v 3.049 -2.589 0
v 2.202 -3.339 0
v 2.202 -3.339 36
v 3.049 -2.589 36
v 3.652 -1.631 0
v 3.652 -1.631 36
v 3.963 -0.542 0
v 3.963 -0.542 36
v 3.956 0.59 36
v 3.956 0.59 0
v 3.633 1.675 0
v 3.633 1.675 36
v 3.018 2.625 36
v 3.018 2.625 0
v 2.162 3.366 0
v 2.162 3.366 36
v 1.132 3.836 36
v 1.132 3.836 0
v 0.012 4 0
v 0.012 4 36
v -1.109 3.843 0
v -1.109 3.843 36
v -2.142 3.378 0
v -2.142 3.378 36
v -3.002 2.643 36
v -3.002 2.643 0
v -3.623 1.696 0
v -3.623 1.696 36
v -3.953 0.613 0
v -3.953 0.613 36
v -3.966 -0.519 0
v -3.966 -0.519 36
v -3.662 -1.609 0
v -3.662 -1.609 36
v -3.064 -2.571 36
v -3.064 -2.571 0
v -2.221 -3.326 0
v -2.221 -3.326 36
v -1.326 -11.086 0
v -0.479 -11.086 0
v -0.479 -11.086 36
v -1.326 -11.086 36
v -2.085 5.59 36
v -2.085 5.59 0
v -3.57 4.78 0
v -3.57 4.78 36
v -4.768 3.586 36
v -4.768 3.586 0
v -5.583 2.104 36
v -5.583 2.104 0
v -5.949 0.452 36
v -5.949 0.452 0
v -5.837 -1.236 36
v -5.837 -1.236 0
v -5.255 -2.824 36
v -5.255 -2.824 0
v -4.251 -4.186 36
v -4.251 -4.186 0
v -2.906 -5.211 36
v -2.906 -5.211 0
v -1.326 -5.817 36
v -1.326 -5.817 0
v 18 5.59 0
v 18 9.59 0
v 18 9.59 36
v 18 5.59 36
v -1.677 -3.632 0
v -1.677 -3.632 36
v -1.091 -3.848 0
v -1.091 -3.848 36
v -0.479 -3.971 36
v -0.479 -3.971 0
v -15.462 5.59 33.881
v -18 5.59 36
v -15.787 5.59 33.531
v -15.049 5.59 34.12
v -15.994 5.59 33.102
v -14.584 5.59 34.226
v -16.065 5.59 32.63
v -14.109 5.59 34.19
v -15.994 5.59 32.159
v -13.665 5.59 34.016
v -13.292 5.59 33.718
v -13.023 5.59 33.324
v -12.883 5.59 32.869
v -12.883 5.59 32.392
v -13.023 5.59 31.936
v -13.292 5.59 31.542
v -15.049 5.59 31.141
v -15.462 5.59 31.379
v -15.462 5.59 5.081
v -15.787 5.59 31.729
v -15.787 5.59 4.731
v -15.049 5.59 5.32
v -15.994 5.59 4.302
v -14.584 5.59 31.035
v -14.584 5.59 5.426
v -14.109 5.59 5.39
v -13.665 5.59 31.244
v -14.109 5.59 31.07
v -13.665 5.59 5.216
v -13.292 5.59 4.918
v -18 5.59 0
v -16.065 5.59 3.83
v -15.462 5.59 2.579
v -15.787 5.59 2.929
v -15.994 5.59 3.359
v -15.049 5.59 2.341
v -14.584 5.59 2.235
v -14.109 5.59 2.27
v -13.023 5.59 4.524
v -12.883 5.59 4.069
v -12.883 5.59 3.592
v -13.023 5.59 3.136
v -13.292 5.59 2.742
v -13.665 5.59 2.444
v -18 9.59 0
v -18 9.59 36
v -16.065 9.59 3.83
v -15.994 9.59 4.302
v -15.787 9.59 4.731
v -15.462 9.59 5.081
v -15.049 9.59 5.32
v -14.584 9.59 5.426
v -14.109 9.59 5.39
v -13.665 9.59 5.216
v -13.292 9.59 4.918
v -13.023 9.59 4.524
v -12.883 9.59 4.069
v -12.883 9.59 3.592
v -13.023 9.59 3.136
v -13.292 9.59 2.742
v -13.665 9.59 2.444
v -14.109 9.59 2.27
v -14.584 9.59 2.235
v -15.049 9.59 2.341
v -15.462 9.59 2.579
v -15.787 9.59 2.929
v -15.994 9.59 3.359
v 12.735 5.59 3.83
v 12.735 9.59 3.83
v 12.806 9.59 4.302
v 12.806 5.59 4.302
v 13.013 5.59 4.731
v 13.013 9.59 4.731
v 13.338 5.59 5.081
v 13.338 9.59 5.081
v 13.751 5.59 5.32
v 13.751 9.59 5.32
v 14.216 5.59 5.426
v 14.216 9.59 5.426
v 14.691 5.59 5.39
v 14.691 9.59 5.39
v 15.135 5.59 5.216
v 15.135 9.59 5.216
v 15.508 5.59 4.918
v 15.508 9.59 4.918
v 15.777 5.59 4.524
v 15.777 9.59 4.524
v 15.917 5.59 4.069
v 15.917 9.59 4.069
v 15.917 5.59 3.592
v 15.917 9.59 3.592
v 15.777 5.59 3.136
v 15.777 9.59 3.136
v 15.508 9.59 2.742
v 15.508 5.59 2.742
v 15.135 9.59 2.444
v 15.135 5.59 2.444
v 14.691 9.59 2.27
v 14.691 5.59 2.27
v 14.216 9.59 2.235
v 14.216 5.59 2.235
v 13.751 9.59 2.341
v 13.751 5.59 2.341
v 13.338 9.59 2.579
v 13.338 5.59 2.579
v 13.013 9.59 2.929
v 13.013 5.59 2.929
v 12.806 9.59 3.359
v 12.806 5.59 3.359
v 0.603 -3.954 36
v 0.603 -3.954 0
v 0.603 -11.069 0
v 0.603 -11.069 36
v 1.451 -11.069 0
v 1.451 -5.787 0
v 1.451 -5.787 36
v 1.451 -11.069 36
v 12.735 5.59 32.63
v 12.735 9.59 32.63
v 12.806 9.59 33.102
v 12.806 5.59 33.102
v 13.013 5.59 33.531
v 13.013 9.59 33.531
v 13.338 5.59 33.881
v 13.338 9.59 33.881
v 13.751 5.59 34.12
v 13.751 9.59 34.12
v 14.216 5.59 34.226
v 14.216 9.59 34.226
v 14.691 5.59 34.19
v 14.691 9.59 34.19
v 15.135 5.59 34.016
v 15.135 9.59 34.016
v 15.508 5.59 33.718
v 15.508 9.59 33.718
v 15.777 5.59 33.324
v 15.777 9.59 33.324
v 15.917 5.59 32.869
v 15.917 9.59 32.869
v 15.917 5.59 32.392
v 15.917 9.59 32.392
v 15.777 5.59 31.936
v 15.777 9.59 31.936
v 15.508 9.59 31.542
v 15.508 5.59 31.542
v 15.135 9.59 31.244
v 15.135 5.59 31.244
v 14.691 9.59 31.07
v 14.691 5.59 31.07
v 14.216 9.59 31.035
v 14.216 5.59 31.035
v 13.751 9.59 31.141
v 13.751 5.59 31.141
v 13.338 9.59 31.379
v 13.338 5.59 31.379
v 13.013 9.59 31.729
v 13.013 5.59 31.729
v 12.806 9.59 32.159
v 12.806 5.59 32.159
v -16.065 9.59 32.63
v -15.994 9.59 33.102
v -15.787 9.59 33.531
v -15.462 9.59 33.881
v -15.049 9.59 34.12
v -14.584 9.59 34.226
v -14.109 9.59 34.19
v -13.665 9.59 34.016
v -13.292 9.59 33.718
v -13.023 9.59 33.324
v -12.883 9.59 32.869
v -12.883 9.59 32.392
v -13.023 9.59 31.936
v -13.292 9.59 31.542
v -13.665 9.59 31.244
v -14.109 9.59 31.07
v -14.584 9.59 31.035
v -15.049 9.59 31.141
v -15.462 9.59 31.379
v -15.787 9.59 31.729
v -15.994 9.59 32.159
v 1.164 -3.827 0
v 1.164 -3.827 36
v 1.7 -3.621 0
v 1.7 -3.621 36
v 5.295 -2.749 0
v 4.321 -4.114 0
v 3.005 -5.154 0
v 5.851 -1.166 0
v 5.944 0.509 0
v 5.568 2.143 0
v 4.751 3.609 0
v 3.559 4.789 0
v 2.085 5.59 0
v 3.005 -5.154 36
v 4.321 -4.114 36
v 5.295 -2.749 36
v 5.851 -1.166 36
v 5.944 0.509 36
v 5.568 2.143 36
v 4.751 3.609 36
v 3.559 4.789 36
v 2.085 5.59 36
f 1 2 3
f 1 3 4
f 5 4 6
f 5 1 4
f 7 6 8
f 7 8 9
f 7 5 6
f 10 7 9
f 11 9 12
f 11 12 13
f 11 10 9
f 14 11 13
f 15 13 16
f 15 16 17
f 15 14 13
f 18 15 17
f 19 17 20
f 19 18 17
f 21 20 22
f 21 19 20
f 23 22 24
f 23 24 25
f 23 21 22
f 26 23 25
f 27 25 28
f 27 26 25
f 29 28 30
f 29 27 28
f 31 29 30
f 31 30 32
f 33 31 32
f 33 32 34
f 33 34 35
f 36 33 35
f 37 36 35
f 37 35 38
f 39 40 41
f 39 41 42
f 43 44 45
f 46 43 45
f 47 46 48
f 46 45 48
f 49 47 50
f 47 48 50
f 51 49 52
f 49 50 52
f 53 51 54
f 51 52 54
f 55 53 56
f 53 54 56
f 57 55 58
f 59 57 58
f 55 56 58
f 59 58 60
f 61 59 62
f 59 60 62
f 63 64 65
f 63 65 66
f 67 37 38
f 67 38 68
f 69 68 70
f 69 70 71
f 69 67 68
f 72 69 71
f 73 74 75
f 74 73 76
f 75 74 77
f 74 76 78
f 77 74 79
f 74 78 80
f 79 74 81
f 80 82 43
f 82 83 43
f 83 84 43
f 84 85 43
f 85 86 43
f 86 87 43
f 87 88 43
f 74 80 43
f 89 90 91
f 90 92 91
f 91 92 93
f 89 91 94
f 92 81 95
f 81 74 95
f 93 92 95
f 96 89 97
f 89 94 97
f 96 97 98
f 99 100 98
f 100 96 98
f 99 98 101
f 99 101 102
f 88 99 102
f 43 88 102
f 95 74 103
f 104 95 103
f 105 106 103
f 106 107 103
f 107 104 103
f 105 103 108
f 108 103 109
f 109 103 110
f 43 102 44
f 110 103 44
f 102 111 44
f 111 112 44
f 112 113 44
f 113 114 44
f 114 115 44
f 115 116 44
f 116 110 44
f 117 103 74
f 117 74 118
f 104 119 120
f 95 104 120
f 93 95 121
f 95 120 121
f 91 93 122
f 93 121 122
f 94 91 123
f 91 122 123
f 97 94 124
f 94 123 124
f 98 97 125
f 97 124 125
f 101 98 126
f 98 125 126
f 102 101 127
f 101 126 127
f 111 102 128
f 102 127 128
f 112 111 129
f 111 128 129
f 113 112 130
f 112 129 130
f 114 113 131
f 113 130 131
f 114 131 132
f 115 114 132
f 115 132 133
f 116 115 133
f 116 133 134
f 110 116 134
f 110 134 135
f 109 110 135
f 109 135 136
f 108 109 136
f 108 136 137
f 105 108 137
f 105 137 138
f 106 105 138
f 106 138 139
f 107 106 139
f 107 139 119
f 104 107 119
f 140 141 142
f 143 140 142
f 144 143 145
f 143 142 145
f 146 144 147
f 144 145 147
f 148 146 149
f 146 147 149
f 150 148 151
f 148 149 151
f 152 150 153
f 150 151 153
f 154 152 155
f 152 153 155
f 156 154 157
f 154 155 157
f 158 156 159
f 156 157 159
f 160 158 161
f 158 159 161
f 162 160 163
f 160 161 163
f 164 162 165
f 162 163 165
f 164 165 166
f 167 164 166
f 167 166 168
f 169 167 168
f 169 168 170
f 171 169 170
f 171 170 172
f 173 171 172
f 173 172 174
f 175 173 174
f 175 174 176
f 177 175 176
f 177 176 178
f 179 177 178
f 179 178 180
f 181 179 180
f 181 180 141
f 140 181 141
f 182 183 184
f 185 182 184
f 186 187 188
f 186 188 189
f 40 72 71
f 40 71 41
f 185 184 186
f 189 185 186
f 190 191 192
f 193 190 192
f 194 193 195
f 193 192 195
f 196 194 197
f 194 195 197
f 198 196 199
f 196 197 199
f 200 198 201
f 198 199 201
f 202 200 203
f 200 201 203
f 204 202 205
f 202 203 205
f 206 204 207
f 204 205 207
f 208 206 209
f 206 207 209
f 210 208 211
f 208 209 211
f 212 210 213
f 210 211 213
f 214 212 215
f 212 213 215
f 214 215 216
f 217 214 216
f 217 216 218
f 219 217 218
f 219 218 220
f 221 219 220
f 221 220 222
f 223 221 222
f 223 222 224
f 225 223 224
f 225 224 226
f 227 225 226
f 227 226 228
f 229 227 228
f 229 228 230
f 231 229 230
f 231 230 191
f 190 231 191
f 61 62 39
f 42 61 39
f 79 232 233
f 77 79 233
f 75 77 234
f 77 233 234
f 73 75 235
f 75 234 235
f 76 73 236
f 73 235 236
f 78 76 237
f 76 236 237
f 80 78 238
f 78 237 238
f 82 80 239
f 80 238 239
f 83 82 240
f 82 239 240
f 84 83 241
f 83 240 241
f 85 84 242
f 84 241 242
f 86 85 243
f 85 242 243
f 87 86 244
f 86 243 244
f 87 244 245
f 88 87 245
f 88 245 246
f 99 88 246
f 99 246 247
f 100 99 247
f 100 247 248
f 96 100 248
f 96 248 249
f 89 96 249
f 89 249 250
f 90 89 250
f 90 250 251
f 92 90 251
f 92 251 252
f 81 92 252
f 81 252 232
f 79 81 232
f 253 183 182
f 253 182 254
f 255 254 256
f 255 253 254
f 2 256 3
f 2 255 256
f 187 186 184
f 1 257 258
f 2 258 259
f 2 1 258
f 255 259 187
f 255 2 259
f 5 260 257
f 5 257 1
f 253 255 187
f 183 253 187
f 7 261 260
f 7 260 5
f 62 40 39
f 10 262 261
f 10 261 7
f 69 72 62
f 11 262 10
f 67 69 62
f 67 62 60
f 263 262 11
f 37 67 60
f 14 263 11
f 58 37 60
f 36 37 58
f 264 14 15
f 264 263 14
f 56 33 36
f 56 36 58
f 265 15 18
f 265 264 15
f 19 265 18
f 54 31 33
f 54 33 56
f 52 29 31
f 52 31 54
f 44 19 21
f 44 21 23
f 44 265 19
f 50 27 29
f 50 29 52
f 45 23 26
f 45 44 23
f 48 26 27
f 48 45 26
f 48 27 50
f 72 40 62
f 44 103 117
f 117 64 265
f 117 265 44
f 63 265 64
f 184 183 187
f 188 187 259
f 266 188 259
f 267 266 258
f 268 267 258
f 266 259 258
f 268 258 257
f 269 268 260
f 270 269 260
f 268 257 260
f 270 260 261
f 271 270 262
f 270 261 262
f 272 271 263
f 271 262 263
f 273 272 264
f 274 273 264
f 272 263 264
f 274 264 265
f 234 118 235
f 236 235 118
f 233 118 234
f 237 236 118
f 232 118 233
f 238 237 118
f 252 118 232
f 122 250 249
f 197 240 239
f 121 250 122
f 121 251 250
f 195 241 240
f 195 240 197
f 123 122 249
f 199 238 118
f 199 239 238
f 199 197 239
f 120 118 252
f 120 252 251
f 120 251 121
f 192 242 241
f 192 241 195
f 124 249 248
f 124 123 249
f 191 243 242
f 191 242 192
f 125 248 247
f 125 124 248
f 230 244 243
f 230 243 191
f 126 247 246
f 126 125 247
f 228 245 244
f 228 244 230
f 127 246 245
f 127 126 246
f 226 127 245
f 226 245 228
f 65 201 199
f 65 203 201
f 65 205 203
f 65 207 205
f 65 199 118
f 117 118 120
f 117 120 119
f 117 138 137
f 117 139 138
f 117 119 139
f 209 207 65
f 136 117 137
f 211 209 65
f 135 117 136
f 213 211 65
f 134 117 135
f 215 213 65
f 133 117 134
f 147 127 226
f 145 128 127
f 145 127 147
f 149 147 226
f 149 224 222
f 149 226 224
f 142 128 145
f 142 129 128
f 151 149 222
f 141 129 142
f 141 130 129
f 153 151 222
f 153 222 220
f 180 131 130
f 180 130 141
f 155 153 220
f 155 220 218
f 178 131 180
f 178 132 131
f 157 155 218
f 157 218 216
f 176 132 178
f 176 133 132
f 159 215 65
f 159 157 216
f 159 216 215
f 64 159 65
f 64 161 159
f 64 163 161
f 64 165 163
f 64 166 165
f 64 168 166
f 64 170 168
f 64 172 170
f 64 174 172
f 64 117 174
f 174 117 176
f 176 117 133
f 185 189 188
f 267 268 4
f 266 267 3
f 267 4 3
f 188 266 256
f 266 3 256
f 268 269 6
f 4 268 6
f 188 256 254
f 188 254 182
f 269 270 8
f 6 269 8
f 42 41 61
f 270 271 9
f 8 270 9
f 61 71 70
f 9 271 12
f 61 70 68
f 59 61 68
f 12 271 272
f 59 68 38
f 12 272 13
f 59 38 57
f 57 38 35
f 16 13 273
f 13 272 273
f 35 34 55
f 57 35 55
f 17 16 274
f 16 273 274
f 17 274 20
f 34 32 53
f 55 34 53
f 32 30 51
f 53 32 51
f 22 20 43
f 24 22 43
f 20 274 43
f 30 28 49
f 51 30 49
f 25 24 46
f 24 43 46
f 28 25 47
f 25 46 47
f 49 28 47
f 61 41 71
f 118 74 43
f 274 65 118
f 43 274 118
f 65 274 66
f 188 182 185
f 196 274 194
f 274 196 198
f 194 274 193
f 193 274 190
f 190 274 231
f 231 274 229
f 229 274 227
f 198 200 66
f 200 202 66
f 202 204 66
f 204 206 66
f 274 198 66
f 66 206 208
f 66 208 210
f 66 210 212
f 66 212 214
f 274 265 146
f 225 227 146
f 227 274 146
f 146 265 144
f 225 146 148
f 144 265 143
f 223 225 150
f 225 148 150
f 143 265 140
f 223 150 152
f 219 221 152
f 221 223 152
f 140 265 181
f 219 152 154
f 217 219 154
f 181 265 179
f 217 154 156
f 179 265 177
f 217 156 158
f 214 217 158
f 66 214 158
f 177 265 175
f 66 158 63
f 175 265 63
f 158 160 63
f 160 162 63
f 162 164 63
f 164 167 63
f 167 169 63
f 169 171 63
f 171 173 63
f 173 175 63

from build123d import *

# Parameters (mm, degrees)
PAD_DEPTH    = 36
SKETCH001_R  = 1.6
POCKET_DEPTH = 10


with BuildPart() as part:
    # Sketch → Pad (new body)
    with BuildSketch(Plane.XY):
        with BuildLine():
            ThreePointArc((2.201846, -3.339442), (0.011769, 3.999983), (-2.22146, -3.326427))
            ThreePointArc((-2.22146, -3.326427), (-1.387999, -3.751461), (-0.478604, -3.971264))
            Line((-0.478604, -3.971264), (-0.478604, -11.086475))
            Line((-0.478604, -11.086475), (-1.32632, -11.086475))
            Line((-1.32632, -5.816765), (-1.32632, -11.086475))
            ThreePointArc((-2.084926, 5.589898), (-5.95291, -0.395901), (-1.32632, -5.816765))
            Line((-18, 5.589898), (-2.084926, 5.589898))
            Line((-18, 5.589898), (-18, 9.589898))
            Line((-18, 9.589898), (18, 9.589898))
            Line((18, 9.589898), (18, 5.589898))
            Line((2.084926, 5.589898), (18, 5.589898))
            ThreePointArc((1.451052, -5.78691), (5.956822, -0.331892), (2.084926, 5.589898))
            Line((1.451052, -5.78691), (1.451052, -11.069447))
            Line((0.603336, -11.069447), (1.451052, -11.069447))
            Line((0.603336, -3.954236), (0.603336, -11.069447))
            ThreePointArc((0.603336, -3.954236), (1.435881, -3.733396), (2.201846, -3.339442))
        make_face()
    extrude(amount=PAD_DEPTH)

    # Sketch001 → Pocket (cut)
    with BuildSketch(Plane(origin=(0, 9.589898, 0), x_dir=(-1, 0, 0), z_dir=(0, 1, 0))):
        with Locations((-14.335366, 32.630134)):
            Circle(SKETCH001_R)
        with Locations((14.464634, 32.630134)):
            Circle(SKETCH001_R)
        with Locations((14.464634, 3.830134)):
            Circle(SKETCH001_R)
        with Locations((-14.335366, 3.830134)):
            Circle(SKETCH001_R)
    extrude(amount=-POCKET_DEPTH, mode=Mode.SUBTRACT)


solid = part.part
